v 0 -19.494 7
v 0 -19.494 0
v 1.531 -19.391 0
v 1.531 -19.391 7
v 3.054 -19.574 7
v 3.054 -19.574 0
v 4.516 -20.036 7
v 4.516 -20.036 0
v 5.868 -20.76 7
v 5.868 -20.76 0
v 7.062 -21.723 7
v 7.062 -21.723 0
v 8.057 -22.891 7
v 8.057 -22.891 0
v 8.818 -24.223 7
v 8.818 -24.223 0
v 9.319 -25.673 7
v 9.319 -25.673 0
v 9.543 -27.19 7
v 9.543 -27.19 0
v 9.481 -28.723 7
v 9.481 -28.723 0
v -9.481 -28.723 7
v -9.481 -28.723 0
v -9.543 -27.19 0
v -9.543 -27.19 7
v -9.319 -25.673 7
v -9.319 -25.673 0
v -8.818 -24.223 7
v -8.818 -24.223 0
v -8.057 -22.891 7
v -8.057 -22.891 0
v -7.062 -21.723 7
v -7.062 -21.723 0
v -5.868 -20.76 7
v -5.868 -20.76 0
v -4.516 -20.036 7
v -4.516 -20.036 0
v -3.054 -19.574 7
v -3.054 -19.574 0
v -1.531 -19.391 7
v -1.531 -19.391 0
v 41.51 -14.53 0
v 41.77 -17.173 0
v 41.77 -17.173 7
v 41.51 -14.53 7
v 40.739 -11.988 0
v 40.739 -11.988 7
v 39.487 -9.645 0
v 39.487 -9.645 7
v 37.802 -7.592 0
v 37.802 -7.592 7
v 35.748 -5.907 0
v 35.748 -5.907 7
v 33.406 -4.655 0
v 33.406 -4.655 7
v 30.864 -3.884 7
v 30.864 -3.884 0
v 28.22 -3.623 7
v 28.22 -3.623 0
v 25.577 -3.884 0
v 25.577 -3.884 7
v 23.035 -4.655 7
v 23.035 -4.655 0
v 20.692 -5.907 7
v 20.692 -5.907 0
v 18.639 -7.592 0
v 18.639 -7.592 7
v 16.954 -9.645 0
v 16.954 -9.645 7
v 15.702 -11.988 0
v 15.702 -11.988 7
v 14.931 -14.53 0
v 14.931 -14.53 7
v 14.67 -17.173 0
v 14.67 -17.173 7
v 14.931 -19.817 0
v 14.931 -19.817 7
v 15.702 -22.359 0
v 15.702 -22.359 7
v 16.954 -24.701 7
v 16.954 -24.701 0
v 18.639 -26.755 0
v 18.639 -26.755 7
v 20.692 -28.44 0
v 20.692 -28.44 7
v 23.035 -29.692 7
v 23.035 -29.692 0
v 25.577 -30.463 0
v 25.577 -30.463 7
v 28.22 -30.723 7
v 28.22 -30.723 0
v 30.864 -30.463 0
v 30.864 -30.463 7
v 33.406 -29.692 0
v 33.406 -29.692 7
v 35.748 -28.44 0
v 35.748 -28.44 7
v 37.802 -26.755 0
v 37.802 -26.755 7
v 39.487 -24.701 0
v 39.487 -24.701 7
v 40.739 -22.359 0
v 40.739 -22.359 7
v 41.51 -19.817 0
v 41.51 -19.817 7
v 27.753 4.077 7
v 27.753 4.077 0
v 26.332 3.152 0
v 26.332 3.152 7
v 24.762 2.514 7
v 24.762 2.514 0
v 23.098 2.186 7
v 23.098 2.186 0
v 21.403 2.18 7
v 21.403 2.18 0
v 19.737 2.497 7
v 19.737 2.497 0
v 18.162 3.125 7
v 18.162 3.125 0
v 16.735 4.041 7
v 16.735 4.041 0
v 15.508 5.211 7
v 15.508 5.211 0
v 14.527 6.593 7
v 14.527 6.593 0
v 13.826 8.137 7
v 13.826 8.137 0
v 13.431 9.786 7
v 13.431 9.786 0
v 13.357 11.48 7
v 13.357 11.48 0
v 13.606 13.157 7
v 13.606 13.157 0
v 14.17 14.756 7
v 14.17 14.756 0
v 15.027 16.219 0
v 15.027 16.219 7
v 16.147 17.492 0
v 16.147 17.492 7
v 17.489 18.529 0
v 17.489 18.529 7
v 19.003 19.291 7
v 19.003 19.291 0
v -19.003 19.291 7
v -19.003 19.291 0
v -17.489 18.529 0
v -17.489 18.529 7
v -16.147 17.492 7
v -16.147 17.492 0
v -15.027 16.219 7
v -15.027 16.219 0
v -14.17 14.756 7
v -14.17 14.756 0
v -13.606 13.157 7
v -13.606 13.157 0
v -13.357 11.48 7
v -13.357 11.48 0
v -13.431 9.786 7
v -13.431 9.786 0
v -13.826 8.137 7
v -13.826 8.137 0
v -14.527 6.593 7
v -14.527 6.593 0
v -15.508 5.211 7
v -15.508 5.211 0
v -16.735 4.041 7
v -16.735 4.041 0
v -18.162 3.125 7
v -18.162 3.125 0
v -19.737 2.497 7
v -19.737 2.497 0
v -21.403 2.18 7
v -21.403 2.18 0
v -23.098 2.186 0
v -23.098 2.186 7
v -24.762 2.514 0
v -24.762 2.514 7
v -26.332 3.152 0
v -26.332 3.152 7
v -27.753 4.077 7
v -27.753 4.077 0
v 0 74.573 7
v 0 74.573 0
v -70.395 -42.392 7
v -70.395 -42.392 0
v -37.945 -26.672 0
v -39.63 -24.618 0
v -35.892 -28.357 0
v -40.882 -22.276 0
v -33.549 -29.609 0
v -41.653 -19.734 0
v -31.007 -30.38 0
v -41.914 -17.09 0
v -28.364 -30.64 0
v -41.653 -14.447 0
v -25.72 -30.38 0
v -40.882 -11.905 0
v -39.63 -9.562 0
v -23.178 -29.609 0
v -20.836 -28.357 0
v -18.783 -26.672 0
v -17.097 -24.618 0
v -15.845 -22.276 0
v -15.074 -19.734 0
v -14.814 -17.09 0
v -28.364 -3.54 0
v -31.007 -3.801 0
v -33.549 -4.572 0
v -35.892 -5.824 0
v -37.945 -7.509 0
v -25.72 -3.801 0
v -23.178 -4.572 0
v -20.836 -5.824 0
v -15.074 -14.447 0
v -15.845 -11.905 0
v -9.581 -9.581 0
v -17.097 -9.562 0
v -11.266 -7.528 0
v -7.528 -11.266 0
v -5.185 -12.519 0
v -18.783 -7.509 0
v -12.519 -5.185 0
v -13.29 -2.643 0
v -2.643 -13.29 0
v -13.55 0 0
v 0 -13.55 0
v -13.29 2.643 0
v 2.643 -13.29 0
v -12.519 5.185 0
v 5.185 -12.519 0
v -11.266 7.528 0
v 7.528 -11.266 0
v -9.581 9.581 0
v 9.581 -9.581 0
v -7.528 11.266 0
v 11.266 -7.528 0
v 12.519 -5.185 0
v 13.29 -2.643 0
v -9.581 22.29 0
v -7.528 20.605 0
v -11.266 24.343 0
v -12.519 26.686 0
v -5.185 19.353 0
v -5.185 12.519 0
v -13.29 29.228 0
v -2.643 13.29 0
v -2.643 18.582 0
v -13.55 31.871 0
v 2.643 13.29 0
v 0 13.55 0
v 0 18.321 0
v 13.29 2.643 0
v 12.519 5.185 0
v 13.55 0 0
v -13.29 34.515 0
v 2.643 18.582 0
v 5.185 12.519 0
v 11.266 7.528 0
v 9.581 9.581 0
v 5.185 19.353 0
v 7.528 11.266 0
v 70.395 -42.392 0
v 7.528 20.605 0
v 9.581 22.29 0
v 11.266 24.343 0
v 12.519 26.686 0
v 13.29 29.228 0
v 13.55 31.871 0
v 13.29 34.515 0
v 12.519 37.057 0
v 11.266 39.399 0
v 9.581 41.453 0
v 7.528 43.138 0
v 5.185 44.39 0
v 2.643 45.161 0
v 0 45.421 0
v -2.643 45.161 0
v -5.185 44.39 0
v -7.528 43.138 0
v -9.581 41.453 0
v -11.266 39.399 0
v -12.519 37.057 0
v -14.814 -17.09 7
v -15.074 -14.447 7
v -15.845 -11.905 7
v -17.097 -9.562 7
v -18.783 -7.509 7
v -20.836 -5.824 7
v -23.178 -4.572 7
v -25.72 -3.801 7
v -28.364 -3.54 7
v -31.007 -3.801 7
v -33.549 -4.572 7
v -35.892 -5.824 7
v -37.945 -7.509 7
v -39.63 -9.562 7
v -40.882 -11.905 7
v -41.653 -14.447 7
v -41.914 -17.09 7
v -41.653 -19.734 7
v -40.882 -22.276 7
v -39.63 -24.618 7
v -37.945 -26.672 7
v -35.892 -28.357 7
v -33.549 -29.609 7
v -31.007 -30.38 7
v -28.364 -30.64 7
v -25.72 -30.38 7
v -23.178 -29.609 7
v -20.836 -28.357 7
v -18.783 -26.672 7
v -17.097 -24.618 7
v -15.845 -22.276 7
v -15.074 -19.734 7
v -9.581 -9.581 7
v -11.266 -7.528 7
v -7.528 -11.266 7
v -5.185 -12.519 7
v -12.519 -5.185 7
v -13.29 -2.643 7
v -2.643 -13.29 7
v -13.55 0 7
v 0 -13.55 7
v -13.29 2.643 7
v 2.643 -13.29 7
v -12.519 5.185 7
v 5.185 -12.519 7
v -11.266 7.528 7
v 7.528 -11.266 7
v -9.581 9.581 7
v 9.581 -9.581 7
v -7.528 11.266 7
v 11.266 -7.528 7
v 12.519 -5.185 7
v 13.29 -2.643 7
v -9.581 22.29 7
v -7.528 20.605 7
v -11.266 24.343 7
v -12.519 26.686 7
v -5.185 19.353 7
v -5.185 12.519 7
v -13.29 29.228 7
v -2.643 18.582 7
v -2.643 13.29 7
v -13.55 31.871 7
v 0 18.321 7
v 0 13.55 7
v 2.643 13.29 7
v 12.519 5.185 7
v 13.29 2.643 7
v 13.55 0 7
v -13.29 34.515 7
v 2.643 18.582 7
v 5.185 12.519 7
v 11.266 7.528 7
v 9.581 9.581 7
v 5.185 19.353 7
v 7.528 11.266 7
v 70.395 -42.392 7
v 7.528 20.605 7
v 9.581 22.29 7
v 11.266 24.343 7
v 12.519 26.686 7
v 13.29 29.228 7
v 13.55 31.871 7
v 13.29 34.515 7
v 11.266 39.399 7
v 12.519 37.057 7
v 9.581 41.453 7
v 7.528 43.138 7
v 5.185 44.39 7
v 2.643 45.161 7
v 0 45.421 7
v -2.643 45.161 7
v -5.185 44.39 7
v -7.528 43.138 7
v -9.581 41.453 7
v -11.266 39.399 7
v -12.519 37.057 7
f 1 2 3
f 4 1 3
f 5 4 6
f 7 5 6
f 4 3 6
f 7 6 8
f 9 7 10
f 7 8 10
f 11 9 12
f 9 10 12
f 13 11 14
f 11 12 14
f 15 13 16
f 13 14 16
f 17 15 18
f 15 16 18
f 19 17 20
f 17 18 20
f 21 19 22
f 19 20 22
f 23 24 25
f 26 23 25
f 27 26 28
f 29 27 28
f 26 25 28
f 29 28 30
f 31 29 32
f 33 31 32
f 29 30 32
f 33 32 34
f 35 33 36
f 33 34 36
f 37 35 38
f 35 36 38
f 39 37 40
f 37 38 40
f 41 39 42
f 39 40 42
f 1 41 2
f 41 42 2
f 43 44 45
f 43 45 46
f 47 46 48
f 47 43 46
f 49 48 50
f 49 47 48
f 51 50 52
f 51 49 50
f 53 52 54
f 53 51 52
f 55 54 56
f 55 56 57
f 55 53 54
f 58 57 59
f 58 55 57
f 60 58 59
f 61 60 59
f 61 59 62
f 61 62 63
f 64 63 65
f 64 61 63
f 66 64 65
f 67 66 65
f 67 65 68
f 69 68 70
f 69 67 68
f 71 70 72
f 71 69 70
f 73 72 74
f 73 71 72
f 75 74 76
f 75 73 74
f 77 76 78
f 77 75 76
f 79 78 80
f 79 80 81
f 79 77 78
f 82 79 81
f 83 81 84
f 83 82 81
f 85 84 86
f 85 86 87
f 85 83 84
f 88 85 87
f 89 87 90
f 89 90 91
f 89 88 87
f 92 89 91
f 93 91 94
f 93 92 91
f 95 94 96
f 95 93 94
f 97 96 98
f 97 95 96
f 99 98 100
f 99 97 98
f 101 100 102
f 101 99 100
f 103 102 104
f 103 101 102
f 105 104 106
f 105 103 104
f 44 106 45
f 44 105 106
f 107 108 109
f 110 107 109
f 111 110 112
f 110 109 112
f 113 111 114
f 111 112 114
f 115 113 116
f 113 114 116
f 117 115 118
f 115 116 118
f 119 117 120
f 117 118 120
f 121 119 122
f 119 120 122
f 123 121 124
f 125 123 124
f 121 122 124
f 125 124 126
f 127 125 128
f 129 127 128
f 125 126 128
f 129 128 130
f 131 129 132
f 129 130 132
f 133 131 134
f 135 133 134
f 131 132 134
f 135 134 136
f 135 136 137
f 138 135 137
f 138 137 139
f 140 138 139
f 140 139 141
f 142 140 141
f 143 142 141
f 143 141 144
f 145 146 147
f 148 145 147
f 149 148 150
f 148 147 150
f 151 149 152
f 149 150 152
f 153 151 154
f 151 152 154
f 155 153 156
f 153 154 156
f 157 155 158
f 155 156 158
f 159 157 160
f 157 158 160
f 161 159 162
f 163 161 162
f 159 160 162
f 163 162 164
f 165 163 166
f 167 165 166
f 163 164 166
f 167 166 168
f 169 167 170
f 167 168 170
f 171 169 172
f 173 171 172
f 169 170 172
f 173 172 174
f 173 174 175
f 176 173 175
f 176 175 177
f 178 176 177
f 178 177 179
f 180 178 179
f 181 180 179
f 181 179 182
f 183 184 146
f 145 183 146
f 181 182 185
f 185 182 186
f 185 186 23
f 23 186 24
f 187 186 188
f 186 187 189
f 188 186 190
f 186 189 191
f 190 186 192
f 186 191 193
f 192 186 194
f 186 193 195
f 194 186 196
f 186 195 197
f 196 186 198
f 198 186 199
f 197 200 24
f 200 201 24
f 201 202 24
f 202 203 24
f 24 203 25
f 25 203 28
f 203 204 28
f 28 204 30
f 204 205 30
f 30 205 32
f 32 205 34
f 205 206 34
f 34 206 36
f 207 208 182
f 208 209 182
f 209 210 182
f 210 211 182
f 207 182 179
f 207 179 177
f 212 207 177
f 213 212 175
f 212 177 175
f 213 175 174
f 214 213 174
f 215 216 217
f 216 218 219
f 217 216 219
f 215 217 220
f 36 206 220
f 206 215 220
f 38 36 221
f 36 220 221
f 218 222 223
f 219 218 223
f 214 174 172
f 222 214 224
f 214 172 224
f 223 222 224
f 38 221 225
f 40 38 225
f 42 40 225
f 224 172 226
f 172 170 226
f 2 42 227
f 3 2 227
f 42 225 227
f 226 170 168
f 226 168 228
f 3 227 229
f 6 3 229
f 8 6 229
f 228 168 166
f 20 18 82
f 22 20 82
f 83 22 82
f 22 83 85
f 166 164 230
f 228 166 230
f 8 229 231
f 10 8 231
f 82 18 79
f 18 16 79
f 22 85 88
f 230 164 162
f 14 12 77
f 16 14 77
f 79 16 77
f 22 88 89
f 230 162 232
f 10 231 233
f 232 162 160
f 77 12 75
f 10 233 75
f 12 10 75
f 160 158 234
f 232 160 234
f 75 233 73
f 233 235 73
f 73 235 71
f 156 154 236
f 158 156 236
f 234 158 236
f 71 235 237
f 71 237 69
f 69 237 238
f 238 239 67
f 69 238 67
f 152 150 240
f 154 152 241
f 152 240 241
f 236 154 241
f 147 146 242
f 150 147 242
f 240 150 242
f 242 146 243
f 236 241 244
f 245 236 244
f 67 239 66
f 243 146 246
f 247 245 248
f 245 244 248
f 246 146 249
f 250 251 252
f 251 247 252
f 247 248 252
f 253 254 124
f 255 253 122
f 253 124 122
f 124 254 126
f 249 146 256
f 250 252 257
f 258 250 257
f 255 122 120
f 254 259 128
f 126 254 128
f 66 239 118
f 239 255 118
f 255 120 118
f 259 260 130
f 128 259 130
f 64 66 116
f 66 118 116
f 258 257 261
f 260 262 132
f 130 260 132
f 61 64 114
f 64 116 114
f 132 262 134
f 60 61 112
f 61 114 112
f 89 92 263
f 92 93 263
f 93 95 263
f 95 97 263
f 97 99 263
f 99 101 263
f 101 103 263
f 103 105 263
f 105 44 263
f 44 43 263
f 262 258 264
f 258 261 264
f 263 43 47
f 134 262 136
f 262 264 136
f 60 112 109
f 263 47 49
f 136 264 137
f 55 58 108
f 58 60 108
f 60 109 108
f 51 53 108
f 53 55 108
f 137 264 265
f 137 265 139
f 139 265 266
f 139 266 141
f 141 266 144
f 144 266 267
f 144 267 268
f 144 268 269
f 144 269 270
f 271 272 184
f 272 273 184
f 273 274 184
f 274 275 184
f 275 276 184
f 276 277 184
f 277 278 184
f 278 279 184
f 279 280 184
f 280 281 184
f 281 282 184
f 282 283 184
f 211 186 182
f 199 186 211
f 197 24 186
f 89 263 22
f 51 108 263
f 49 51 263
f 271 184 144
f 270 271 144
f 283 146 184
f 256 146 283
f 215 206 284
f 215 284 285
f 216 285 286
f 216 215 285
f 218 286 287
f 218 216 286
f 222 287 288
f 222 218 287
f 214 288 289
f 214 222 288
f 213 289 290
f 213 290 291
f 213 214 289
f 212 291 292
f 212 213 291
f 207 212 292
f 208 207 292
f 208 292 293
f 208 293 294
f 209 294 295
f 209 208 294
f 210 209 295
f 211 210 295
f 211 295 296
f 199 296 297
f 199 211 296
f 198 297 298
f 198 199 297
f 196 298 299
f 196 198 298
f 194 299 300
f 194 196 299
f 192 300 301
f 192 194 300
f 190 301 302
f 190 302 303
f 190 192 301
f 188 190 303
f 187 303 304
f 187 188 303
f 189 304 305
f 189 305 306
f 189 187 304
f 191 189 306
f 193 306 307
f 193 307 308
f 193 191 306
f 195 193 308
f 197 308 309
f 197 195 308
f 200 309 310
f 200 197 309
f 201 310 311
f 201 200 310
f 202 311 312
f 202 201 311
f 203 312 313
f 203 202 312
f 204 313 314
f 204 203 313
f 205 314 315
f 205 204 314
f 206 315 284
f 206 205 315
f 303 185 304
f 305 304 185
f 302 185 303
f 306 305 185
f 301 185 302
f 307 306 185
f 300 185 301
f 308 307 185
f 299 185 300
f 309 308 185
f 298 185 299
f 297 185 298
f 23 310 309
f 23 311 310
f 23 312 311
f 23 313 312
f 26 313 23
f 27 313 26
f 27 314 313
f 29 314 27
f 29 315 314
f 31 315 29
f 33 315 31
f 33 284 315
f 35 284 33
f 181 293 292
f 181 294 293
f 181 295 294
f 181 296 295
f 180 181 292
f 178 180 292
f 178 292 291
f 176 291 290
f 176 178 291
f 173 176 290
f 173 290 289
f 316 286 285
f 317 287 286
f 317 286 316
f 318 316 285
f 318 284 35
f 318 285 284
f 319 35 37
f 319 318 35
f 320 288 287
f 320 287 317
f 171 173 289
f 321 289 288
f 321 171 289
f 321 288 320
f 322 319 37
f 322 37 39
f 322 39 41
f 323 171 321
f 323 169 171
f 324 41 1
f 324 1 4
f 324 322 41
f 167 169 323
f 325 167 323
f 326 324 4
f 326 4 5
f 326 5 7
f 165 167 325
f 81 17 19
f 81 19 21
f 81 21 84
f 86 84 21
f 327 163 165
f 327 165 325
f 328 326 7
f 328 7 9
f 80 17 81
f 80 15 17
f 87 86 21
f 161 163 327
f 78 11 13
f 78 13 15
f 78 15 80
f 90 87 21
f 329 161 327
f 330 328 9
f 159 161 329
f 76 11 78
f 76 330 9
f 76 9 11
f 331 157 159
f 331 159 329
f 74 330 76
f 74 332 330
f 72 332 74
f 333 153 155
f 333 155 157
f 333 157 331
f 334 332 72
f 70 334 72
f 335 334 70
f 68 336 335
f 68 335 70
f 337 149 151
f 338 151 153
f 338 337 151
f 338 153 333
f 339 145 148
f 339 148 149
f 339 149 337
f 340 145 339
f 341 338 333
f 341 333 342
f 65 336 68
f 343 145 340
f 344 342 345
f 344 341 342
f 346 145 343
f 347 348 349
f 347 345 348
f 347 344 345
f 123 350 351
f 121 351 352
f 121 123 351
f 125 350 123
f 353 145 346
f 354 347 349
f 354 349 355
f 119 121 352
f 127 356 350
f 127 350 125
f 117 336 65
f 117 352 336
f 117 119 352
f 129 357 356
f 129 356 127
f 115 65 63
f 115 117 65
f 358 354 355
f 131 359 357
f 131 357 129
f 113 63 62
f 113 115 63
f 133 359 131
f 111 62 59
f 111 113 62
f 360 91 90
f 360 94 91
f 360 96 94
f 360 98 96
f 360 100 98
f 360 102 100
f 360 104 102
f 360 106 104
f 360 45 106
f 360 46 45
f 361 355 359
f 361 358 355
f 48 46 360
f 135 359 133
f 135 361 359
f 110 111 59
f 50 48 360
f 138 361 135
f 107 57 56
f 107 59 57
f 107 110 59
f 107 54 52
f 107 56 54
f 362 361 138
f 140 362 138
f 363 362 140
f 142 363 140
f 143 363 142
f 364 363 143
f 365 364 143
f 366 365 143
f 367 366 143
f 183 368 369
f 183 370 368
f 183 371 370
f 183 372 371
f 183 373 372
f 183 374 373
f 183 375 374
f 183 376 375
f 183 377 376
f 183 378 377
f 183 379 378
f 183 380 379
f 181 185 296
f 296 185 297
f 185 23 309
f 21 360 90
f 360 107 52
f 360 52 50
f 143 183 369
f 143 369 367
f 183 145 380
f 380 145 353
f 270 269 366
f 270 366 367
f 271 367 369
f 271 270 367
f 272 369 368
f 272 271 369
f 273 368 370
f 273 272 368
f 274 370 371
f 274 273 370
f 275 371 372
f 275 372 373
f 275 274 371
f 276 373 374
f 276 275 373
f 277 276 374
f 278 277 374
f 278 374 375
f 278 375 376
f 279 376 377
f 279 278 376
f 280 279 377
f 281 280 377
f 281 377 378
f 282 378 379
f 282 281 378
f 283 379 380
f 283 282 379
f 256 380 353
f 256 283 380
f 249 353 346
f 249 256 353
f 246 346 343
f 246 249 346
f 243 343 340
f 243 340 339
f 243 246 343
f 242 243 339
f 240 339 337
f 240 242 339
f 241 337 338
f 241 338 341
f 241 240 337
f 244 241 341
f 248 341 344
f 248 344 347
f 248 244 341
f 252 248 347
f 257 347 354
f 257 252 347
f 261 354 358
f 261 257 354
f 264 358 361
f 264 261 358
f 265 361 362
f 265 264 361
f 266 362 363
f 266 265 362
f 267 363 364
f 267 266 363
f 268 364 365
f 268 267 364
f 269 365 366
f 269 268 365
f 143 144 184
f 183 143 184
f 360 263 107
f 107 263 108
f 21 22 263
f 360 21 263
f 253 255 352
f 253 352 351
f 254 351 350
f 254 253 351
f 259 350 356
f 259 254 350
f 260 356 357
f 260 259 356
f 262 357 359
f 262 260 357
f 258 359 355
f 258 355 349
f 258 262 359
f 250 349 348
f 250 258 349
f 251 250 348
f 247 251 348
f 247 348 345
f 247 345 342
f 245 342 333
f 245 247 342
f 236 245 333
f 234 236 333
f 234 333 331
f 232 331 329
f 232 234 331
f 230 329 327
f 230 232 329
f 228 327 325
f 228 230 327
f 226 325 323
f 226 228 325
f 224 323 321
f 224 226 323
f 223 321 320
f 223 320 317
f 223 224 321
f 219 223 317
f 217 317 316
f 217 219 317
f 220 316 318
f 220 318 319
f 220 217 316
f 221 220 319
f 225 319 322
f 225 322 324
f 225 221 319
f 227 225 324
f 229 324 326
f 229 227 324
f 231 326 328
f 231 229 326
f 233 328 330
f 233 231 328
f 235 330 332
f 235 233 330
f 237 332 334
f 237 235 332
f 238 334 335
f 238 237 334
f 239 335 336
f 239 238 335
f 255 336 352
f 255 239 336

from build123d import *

# Parameters (mm, degrees)
F0_R     = 13.55
F1_DEPTH = 7


with BuildPart() as f1:
    # F0 (on Top) → F1 (new body)
    with BuildSketch(Plane.XY):
        with BuildLine():
            ThreePointArc((-19.002935, 19.291424), (-14.526693, 6.593441), (-27.753296, 4.076997))
            Line((-27.753296, 4.076997), (-70.395388, -42.391945))
            Line((-70.395388, -42.391945), (-9.481418, -28.723067))
            ThreePointArc((-9.481418, -28.723067), (-7.062366, -21.723421), (0, -19.494107))
            ThreePointArc((0, -19.494107), (7.062366, -21.723421), (9.481418, -28.723067))
            Line((9.481418, -28.723067), (70.395388, -42.391945))
            Line((70.395388, -42.391945), (27.753296, 4.076997))
            ThreePointArc((27.753296, 4.076997), (14.526693, 6.593441), (19.002935, 19.291424))
            Line((19.002935, 19.291424), (0, 74.57269))
            Line((0, 74.57269), (-19.002935, 19.291424))
        make_face()
        with Locations((-28.363841, -17.090467)):
            Circle(F0_R, mode=Mode.SUBTRACT)
        with Locations((28.22023, -17.173382)):
            Circle(F0_R, mode=Mode.SUBTRACT)
        Circle(F0_R, mode=Mode.SUBTRACT)
        with Locations((0, 31.871319)):
            Circle(F0_R, mode=Mode.SUBTRACT)
    extrude(amount=F1_DEPTH)


solid = f1.part
